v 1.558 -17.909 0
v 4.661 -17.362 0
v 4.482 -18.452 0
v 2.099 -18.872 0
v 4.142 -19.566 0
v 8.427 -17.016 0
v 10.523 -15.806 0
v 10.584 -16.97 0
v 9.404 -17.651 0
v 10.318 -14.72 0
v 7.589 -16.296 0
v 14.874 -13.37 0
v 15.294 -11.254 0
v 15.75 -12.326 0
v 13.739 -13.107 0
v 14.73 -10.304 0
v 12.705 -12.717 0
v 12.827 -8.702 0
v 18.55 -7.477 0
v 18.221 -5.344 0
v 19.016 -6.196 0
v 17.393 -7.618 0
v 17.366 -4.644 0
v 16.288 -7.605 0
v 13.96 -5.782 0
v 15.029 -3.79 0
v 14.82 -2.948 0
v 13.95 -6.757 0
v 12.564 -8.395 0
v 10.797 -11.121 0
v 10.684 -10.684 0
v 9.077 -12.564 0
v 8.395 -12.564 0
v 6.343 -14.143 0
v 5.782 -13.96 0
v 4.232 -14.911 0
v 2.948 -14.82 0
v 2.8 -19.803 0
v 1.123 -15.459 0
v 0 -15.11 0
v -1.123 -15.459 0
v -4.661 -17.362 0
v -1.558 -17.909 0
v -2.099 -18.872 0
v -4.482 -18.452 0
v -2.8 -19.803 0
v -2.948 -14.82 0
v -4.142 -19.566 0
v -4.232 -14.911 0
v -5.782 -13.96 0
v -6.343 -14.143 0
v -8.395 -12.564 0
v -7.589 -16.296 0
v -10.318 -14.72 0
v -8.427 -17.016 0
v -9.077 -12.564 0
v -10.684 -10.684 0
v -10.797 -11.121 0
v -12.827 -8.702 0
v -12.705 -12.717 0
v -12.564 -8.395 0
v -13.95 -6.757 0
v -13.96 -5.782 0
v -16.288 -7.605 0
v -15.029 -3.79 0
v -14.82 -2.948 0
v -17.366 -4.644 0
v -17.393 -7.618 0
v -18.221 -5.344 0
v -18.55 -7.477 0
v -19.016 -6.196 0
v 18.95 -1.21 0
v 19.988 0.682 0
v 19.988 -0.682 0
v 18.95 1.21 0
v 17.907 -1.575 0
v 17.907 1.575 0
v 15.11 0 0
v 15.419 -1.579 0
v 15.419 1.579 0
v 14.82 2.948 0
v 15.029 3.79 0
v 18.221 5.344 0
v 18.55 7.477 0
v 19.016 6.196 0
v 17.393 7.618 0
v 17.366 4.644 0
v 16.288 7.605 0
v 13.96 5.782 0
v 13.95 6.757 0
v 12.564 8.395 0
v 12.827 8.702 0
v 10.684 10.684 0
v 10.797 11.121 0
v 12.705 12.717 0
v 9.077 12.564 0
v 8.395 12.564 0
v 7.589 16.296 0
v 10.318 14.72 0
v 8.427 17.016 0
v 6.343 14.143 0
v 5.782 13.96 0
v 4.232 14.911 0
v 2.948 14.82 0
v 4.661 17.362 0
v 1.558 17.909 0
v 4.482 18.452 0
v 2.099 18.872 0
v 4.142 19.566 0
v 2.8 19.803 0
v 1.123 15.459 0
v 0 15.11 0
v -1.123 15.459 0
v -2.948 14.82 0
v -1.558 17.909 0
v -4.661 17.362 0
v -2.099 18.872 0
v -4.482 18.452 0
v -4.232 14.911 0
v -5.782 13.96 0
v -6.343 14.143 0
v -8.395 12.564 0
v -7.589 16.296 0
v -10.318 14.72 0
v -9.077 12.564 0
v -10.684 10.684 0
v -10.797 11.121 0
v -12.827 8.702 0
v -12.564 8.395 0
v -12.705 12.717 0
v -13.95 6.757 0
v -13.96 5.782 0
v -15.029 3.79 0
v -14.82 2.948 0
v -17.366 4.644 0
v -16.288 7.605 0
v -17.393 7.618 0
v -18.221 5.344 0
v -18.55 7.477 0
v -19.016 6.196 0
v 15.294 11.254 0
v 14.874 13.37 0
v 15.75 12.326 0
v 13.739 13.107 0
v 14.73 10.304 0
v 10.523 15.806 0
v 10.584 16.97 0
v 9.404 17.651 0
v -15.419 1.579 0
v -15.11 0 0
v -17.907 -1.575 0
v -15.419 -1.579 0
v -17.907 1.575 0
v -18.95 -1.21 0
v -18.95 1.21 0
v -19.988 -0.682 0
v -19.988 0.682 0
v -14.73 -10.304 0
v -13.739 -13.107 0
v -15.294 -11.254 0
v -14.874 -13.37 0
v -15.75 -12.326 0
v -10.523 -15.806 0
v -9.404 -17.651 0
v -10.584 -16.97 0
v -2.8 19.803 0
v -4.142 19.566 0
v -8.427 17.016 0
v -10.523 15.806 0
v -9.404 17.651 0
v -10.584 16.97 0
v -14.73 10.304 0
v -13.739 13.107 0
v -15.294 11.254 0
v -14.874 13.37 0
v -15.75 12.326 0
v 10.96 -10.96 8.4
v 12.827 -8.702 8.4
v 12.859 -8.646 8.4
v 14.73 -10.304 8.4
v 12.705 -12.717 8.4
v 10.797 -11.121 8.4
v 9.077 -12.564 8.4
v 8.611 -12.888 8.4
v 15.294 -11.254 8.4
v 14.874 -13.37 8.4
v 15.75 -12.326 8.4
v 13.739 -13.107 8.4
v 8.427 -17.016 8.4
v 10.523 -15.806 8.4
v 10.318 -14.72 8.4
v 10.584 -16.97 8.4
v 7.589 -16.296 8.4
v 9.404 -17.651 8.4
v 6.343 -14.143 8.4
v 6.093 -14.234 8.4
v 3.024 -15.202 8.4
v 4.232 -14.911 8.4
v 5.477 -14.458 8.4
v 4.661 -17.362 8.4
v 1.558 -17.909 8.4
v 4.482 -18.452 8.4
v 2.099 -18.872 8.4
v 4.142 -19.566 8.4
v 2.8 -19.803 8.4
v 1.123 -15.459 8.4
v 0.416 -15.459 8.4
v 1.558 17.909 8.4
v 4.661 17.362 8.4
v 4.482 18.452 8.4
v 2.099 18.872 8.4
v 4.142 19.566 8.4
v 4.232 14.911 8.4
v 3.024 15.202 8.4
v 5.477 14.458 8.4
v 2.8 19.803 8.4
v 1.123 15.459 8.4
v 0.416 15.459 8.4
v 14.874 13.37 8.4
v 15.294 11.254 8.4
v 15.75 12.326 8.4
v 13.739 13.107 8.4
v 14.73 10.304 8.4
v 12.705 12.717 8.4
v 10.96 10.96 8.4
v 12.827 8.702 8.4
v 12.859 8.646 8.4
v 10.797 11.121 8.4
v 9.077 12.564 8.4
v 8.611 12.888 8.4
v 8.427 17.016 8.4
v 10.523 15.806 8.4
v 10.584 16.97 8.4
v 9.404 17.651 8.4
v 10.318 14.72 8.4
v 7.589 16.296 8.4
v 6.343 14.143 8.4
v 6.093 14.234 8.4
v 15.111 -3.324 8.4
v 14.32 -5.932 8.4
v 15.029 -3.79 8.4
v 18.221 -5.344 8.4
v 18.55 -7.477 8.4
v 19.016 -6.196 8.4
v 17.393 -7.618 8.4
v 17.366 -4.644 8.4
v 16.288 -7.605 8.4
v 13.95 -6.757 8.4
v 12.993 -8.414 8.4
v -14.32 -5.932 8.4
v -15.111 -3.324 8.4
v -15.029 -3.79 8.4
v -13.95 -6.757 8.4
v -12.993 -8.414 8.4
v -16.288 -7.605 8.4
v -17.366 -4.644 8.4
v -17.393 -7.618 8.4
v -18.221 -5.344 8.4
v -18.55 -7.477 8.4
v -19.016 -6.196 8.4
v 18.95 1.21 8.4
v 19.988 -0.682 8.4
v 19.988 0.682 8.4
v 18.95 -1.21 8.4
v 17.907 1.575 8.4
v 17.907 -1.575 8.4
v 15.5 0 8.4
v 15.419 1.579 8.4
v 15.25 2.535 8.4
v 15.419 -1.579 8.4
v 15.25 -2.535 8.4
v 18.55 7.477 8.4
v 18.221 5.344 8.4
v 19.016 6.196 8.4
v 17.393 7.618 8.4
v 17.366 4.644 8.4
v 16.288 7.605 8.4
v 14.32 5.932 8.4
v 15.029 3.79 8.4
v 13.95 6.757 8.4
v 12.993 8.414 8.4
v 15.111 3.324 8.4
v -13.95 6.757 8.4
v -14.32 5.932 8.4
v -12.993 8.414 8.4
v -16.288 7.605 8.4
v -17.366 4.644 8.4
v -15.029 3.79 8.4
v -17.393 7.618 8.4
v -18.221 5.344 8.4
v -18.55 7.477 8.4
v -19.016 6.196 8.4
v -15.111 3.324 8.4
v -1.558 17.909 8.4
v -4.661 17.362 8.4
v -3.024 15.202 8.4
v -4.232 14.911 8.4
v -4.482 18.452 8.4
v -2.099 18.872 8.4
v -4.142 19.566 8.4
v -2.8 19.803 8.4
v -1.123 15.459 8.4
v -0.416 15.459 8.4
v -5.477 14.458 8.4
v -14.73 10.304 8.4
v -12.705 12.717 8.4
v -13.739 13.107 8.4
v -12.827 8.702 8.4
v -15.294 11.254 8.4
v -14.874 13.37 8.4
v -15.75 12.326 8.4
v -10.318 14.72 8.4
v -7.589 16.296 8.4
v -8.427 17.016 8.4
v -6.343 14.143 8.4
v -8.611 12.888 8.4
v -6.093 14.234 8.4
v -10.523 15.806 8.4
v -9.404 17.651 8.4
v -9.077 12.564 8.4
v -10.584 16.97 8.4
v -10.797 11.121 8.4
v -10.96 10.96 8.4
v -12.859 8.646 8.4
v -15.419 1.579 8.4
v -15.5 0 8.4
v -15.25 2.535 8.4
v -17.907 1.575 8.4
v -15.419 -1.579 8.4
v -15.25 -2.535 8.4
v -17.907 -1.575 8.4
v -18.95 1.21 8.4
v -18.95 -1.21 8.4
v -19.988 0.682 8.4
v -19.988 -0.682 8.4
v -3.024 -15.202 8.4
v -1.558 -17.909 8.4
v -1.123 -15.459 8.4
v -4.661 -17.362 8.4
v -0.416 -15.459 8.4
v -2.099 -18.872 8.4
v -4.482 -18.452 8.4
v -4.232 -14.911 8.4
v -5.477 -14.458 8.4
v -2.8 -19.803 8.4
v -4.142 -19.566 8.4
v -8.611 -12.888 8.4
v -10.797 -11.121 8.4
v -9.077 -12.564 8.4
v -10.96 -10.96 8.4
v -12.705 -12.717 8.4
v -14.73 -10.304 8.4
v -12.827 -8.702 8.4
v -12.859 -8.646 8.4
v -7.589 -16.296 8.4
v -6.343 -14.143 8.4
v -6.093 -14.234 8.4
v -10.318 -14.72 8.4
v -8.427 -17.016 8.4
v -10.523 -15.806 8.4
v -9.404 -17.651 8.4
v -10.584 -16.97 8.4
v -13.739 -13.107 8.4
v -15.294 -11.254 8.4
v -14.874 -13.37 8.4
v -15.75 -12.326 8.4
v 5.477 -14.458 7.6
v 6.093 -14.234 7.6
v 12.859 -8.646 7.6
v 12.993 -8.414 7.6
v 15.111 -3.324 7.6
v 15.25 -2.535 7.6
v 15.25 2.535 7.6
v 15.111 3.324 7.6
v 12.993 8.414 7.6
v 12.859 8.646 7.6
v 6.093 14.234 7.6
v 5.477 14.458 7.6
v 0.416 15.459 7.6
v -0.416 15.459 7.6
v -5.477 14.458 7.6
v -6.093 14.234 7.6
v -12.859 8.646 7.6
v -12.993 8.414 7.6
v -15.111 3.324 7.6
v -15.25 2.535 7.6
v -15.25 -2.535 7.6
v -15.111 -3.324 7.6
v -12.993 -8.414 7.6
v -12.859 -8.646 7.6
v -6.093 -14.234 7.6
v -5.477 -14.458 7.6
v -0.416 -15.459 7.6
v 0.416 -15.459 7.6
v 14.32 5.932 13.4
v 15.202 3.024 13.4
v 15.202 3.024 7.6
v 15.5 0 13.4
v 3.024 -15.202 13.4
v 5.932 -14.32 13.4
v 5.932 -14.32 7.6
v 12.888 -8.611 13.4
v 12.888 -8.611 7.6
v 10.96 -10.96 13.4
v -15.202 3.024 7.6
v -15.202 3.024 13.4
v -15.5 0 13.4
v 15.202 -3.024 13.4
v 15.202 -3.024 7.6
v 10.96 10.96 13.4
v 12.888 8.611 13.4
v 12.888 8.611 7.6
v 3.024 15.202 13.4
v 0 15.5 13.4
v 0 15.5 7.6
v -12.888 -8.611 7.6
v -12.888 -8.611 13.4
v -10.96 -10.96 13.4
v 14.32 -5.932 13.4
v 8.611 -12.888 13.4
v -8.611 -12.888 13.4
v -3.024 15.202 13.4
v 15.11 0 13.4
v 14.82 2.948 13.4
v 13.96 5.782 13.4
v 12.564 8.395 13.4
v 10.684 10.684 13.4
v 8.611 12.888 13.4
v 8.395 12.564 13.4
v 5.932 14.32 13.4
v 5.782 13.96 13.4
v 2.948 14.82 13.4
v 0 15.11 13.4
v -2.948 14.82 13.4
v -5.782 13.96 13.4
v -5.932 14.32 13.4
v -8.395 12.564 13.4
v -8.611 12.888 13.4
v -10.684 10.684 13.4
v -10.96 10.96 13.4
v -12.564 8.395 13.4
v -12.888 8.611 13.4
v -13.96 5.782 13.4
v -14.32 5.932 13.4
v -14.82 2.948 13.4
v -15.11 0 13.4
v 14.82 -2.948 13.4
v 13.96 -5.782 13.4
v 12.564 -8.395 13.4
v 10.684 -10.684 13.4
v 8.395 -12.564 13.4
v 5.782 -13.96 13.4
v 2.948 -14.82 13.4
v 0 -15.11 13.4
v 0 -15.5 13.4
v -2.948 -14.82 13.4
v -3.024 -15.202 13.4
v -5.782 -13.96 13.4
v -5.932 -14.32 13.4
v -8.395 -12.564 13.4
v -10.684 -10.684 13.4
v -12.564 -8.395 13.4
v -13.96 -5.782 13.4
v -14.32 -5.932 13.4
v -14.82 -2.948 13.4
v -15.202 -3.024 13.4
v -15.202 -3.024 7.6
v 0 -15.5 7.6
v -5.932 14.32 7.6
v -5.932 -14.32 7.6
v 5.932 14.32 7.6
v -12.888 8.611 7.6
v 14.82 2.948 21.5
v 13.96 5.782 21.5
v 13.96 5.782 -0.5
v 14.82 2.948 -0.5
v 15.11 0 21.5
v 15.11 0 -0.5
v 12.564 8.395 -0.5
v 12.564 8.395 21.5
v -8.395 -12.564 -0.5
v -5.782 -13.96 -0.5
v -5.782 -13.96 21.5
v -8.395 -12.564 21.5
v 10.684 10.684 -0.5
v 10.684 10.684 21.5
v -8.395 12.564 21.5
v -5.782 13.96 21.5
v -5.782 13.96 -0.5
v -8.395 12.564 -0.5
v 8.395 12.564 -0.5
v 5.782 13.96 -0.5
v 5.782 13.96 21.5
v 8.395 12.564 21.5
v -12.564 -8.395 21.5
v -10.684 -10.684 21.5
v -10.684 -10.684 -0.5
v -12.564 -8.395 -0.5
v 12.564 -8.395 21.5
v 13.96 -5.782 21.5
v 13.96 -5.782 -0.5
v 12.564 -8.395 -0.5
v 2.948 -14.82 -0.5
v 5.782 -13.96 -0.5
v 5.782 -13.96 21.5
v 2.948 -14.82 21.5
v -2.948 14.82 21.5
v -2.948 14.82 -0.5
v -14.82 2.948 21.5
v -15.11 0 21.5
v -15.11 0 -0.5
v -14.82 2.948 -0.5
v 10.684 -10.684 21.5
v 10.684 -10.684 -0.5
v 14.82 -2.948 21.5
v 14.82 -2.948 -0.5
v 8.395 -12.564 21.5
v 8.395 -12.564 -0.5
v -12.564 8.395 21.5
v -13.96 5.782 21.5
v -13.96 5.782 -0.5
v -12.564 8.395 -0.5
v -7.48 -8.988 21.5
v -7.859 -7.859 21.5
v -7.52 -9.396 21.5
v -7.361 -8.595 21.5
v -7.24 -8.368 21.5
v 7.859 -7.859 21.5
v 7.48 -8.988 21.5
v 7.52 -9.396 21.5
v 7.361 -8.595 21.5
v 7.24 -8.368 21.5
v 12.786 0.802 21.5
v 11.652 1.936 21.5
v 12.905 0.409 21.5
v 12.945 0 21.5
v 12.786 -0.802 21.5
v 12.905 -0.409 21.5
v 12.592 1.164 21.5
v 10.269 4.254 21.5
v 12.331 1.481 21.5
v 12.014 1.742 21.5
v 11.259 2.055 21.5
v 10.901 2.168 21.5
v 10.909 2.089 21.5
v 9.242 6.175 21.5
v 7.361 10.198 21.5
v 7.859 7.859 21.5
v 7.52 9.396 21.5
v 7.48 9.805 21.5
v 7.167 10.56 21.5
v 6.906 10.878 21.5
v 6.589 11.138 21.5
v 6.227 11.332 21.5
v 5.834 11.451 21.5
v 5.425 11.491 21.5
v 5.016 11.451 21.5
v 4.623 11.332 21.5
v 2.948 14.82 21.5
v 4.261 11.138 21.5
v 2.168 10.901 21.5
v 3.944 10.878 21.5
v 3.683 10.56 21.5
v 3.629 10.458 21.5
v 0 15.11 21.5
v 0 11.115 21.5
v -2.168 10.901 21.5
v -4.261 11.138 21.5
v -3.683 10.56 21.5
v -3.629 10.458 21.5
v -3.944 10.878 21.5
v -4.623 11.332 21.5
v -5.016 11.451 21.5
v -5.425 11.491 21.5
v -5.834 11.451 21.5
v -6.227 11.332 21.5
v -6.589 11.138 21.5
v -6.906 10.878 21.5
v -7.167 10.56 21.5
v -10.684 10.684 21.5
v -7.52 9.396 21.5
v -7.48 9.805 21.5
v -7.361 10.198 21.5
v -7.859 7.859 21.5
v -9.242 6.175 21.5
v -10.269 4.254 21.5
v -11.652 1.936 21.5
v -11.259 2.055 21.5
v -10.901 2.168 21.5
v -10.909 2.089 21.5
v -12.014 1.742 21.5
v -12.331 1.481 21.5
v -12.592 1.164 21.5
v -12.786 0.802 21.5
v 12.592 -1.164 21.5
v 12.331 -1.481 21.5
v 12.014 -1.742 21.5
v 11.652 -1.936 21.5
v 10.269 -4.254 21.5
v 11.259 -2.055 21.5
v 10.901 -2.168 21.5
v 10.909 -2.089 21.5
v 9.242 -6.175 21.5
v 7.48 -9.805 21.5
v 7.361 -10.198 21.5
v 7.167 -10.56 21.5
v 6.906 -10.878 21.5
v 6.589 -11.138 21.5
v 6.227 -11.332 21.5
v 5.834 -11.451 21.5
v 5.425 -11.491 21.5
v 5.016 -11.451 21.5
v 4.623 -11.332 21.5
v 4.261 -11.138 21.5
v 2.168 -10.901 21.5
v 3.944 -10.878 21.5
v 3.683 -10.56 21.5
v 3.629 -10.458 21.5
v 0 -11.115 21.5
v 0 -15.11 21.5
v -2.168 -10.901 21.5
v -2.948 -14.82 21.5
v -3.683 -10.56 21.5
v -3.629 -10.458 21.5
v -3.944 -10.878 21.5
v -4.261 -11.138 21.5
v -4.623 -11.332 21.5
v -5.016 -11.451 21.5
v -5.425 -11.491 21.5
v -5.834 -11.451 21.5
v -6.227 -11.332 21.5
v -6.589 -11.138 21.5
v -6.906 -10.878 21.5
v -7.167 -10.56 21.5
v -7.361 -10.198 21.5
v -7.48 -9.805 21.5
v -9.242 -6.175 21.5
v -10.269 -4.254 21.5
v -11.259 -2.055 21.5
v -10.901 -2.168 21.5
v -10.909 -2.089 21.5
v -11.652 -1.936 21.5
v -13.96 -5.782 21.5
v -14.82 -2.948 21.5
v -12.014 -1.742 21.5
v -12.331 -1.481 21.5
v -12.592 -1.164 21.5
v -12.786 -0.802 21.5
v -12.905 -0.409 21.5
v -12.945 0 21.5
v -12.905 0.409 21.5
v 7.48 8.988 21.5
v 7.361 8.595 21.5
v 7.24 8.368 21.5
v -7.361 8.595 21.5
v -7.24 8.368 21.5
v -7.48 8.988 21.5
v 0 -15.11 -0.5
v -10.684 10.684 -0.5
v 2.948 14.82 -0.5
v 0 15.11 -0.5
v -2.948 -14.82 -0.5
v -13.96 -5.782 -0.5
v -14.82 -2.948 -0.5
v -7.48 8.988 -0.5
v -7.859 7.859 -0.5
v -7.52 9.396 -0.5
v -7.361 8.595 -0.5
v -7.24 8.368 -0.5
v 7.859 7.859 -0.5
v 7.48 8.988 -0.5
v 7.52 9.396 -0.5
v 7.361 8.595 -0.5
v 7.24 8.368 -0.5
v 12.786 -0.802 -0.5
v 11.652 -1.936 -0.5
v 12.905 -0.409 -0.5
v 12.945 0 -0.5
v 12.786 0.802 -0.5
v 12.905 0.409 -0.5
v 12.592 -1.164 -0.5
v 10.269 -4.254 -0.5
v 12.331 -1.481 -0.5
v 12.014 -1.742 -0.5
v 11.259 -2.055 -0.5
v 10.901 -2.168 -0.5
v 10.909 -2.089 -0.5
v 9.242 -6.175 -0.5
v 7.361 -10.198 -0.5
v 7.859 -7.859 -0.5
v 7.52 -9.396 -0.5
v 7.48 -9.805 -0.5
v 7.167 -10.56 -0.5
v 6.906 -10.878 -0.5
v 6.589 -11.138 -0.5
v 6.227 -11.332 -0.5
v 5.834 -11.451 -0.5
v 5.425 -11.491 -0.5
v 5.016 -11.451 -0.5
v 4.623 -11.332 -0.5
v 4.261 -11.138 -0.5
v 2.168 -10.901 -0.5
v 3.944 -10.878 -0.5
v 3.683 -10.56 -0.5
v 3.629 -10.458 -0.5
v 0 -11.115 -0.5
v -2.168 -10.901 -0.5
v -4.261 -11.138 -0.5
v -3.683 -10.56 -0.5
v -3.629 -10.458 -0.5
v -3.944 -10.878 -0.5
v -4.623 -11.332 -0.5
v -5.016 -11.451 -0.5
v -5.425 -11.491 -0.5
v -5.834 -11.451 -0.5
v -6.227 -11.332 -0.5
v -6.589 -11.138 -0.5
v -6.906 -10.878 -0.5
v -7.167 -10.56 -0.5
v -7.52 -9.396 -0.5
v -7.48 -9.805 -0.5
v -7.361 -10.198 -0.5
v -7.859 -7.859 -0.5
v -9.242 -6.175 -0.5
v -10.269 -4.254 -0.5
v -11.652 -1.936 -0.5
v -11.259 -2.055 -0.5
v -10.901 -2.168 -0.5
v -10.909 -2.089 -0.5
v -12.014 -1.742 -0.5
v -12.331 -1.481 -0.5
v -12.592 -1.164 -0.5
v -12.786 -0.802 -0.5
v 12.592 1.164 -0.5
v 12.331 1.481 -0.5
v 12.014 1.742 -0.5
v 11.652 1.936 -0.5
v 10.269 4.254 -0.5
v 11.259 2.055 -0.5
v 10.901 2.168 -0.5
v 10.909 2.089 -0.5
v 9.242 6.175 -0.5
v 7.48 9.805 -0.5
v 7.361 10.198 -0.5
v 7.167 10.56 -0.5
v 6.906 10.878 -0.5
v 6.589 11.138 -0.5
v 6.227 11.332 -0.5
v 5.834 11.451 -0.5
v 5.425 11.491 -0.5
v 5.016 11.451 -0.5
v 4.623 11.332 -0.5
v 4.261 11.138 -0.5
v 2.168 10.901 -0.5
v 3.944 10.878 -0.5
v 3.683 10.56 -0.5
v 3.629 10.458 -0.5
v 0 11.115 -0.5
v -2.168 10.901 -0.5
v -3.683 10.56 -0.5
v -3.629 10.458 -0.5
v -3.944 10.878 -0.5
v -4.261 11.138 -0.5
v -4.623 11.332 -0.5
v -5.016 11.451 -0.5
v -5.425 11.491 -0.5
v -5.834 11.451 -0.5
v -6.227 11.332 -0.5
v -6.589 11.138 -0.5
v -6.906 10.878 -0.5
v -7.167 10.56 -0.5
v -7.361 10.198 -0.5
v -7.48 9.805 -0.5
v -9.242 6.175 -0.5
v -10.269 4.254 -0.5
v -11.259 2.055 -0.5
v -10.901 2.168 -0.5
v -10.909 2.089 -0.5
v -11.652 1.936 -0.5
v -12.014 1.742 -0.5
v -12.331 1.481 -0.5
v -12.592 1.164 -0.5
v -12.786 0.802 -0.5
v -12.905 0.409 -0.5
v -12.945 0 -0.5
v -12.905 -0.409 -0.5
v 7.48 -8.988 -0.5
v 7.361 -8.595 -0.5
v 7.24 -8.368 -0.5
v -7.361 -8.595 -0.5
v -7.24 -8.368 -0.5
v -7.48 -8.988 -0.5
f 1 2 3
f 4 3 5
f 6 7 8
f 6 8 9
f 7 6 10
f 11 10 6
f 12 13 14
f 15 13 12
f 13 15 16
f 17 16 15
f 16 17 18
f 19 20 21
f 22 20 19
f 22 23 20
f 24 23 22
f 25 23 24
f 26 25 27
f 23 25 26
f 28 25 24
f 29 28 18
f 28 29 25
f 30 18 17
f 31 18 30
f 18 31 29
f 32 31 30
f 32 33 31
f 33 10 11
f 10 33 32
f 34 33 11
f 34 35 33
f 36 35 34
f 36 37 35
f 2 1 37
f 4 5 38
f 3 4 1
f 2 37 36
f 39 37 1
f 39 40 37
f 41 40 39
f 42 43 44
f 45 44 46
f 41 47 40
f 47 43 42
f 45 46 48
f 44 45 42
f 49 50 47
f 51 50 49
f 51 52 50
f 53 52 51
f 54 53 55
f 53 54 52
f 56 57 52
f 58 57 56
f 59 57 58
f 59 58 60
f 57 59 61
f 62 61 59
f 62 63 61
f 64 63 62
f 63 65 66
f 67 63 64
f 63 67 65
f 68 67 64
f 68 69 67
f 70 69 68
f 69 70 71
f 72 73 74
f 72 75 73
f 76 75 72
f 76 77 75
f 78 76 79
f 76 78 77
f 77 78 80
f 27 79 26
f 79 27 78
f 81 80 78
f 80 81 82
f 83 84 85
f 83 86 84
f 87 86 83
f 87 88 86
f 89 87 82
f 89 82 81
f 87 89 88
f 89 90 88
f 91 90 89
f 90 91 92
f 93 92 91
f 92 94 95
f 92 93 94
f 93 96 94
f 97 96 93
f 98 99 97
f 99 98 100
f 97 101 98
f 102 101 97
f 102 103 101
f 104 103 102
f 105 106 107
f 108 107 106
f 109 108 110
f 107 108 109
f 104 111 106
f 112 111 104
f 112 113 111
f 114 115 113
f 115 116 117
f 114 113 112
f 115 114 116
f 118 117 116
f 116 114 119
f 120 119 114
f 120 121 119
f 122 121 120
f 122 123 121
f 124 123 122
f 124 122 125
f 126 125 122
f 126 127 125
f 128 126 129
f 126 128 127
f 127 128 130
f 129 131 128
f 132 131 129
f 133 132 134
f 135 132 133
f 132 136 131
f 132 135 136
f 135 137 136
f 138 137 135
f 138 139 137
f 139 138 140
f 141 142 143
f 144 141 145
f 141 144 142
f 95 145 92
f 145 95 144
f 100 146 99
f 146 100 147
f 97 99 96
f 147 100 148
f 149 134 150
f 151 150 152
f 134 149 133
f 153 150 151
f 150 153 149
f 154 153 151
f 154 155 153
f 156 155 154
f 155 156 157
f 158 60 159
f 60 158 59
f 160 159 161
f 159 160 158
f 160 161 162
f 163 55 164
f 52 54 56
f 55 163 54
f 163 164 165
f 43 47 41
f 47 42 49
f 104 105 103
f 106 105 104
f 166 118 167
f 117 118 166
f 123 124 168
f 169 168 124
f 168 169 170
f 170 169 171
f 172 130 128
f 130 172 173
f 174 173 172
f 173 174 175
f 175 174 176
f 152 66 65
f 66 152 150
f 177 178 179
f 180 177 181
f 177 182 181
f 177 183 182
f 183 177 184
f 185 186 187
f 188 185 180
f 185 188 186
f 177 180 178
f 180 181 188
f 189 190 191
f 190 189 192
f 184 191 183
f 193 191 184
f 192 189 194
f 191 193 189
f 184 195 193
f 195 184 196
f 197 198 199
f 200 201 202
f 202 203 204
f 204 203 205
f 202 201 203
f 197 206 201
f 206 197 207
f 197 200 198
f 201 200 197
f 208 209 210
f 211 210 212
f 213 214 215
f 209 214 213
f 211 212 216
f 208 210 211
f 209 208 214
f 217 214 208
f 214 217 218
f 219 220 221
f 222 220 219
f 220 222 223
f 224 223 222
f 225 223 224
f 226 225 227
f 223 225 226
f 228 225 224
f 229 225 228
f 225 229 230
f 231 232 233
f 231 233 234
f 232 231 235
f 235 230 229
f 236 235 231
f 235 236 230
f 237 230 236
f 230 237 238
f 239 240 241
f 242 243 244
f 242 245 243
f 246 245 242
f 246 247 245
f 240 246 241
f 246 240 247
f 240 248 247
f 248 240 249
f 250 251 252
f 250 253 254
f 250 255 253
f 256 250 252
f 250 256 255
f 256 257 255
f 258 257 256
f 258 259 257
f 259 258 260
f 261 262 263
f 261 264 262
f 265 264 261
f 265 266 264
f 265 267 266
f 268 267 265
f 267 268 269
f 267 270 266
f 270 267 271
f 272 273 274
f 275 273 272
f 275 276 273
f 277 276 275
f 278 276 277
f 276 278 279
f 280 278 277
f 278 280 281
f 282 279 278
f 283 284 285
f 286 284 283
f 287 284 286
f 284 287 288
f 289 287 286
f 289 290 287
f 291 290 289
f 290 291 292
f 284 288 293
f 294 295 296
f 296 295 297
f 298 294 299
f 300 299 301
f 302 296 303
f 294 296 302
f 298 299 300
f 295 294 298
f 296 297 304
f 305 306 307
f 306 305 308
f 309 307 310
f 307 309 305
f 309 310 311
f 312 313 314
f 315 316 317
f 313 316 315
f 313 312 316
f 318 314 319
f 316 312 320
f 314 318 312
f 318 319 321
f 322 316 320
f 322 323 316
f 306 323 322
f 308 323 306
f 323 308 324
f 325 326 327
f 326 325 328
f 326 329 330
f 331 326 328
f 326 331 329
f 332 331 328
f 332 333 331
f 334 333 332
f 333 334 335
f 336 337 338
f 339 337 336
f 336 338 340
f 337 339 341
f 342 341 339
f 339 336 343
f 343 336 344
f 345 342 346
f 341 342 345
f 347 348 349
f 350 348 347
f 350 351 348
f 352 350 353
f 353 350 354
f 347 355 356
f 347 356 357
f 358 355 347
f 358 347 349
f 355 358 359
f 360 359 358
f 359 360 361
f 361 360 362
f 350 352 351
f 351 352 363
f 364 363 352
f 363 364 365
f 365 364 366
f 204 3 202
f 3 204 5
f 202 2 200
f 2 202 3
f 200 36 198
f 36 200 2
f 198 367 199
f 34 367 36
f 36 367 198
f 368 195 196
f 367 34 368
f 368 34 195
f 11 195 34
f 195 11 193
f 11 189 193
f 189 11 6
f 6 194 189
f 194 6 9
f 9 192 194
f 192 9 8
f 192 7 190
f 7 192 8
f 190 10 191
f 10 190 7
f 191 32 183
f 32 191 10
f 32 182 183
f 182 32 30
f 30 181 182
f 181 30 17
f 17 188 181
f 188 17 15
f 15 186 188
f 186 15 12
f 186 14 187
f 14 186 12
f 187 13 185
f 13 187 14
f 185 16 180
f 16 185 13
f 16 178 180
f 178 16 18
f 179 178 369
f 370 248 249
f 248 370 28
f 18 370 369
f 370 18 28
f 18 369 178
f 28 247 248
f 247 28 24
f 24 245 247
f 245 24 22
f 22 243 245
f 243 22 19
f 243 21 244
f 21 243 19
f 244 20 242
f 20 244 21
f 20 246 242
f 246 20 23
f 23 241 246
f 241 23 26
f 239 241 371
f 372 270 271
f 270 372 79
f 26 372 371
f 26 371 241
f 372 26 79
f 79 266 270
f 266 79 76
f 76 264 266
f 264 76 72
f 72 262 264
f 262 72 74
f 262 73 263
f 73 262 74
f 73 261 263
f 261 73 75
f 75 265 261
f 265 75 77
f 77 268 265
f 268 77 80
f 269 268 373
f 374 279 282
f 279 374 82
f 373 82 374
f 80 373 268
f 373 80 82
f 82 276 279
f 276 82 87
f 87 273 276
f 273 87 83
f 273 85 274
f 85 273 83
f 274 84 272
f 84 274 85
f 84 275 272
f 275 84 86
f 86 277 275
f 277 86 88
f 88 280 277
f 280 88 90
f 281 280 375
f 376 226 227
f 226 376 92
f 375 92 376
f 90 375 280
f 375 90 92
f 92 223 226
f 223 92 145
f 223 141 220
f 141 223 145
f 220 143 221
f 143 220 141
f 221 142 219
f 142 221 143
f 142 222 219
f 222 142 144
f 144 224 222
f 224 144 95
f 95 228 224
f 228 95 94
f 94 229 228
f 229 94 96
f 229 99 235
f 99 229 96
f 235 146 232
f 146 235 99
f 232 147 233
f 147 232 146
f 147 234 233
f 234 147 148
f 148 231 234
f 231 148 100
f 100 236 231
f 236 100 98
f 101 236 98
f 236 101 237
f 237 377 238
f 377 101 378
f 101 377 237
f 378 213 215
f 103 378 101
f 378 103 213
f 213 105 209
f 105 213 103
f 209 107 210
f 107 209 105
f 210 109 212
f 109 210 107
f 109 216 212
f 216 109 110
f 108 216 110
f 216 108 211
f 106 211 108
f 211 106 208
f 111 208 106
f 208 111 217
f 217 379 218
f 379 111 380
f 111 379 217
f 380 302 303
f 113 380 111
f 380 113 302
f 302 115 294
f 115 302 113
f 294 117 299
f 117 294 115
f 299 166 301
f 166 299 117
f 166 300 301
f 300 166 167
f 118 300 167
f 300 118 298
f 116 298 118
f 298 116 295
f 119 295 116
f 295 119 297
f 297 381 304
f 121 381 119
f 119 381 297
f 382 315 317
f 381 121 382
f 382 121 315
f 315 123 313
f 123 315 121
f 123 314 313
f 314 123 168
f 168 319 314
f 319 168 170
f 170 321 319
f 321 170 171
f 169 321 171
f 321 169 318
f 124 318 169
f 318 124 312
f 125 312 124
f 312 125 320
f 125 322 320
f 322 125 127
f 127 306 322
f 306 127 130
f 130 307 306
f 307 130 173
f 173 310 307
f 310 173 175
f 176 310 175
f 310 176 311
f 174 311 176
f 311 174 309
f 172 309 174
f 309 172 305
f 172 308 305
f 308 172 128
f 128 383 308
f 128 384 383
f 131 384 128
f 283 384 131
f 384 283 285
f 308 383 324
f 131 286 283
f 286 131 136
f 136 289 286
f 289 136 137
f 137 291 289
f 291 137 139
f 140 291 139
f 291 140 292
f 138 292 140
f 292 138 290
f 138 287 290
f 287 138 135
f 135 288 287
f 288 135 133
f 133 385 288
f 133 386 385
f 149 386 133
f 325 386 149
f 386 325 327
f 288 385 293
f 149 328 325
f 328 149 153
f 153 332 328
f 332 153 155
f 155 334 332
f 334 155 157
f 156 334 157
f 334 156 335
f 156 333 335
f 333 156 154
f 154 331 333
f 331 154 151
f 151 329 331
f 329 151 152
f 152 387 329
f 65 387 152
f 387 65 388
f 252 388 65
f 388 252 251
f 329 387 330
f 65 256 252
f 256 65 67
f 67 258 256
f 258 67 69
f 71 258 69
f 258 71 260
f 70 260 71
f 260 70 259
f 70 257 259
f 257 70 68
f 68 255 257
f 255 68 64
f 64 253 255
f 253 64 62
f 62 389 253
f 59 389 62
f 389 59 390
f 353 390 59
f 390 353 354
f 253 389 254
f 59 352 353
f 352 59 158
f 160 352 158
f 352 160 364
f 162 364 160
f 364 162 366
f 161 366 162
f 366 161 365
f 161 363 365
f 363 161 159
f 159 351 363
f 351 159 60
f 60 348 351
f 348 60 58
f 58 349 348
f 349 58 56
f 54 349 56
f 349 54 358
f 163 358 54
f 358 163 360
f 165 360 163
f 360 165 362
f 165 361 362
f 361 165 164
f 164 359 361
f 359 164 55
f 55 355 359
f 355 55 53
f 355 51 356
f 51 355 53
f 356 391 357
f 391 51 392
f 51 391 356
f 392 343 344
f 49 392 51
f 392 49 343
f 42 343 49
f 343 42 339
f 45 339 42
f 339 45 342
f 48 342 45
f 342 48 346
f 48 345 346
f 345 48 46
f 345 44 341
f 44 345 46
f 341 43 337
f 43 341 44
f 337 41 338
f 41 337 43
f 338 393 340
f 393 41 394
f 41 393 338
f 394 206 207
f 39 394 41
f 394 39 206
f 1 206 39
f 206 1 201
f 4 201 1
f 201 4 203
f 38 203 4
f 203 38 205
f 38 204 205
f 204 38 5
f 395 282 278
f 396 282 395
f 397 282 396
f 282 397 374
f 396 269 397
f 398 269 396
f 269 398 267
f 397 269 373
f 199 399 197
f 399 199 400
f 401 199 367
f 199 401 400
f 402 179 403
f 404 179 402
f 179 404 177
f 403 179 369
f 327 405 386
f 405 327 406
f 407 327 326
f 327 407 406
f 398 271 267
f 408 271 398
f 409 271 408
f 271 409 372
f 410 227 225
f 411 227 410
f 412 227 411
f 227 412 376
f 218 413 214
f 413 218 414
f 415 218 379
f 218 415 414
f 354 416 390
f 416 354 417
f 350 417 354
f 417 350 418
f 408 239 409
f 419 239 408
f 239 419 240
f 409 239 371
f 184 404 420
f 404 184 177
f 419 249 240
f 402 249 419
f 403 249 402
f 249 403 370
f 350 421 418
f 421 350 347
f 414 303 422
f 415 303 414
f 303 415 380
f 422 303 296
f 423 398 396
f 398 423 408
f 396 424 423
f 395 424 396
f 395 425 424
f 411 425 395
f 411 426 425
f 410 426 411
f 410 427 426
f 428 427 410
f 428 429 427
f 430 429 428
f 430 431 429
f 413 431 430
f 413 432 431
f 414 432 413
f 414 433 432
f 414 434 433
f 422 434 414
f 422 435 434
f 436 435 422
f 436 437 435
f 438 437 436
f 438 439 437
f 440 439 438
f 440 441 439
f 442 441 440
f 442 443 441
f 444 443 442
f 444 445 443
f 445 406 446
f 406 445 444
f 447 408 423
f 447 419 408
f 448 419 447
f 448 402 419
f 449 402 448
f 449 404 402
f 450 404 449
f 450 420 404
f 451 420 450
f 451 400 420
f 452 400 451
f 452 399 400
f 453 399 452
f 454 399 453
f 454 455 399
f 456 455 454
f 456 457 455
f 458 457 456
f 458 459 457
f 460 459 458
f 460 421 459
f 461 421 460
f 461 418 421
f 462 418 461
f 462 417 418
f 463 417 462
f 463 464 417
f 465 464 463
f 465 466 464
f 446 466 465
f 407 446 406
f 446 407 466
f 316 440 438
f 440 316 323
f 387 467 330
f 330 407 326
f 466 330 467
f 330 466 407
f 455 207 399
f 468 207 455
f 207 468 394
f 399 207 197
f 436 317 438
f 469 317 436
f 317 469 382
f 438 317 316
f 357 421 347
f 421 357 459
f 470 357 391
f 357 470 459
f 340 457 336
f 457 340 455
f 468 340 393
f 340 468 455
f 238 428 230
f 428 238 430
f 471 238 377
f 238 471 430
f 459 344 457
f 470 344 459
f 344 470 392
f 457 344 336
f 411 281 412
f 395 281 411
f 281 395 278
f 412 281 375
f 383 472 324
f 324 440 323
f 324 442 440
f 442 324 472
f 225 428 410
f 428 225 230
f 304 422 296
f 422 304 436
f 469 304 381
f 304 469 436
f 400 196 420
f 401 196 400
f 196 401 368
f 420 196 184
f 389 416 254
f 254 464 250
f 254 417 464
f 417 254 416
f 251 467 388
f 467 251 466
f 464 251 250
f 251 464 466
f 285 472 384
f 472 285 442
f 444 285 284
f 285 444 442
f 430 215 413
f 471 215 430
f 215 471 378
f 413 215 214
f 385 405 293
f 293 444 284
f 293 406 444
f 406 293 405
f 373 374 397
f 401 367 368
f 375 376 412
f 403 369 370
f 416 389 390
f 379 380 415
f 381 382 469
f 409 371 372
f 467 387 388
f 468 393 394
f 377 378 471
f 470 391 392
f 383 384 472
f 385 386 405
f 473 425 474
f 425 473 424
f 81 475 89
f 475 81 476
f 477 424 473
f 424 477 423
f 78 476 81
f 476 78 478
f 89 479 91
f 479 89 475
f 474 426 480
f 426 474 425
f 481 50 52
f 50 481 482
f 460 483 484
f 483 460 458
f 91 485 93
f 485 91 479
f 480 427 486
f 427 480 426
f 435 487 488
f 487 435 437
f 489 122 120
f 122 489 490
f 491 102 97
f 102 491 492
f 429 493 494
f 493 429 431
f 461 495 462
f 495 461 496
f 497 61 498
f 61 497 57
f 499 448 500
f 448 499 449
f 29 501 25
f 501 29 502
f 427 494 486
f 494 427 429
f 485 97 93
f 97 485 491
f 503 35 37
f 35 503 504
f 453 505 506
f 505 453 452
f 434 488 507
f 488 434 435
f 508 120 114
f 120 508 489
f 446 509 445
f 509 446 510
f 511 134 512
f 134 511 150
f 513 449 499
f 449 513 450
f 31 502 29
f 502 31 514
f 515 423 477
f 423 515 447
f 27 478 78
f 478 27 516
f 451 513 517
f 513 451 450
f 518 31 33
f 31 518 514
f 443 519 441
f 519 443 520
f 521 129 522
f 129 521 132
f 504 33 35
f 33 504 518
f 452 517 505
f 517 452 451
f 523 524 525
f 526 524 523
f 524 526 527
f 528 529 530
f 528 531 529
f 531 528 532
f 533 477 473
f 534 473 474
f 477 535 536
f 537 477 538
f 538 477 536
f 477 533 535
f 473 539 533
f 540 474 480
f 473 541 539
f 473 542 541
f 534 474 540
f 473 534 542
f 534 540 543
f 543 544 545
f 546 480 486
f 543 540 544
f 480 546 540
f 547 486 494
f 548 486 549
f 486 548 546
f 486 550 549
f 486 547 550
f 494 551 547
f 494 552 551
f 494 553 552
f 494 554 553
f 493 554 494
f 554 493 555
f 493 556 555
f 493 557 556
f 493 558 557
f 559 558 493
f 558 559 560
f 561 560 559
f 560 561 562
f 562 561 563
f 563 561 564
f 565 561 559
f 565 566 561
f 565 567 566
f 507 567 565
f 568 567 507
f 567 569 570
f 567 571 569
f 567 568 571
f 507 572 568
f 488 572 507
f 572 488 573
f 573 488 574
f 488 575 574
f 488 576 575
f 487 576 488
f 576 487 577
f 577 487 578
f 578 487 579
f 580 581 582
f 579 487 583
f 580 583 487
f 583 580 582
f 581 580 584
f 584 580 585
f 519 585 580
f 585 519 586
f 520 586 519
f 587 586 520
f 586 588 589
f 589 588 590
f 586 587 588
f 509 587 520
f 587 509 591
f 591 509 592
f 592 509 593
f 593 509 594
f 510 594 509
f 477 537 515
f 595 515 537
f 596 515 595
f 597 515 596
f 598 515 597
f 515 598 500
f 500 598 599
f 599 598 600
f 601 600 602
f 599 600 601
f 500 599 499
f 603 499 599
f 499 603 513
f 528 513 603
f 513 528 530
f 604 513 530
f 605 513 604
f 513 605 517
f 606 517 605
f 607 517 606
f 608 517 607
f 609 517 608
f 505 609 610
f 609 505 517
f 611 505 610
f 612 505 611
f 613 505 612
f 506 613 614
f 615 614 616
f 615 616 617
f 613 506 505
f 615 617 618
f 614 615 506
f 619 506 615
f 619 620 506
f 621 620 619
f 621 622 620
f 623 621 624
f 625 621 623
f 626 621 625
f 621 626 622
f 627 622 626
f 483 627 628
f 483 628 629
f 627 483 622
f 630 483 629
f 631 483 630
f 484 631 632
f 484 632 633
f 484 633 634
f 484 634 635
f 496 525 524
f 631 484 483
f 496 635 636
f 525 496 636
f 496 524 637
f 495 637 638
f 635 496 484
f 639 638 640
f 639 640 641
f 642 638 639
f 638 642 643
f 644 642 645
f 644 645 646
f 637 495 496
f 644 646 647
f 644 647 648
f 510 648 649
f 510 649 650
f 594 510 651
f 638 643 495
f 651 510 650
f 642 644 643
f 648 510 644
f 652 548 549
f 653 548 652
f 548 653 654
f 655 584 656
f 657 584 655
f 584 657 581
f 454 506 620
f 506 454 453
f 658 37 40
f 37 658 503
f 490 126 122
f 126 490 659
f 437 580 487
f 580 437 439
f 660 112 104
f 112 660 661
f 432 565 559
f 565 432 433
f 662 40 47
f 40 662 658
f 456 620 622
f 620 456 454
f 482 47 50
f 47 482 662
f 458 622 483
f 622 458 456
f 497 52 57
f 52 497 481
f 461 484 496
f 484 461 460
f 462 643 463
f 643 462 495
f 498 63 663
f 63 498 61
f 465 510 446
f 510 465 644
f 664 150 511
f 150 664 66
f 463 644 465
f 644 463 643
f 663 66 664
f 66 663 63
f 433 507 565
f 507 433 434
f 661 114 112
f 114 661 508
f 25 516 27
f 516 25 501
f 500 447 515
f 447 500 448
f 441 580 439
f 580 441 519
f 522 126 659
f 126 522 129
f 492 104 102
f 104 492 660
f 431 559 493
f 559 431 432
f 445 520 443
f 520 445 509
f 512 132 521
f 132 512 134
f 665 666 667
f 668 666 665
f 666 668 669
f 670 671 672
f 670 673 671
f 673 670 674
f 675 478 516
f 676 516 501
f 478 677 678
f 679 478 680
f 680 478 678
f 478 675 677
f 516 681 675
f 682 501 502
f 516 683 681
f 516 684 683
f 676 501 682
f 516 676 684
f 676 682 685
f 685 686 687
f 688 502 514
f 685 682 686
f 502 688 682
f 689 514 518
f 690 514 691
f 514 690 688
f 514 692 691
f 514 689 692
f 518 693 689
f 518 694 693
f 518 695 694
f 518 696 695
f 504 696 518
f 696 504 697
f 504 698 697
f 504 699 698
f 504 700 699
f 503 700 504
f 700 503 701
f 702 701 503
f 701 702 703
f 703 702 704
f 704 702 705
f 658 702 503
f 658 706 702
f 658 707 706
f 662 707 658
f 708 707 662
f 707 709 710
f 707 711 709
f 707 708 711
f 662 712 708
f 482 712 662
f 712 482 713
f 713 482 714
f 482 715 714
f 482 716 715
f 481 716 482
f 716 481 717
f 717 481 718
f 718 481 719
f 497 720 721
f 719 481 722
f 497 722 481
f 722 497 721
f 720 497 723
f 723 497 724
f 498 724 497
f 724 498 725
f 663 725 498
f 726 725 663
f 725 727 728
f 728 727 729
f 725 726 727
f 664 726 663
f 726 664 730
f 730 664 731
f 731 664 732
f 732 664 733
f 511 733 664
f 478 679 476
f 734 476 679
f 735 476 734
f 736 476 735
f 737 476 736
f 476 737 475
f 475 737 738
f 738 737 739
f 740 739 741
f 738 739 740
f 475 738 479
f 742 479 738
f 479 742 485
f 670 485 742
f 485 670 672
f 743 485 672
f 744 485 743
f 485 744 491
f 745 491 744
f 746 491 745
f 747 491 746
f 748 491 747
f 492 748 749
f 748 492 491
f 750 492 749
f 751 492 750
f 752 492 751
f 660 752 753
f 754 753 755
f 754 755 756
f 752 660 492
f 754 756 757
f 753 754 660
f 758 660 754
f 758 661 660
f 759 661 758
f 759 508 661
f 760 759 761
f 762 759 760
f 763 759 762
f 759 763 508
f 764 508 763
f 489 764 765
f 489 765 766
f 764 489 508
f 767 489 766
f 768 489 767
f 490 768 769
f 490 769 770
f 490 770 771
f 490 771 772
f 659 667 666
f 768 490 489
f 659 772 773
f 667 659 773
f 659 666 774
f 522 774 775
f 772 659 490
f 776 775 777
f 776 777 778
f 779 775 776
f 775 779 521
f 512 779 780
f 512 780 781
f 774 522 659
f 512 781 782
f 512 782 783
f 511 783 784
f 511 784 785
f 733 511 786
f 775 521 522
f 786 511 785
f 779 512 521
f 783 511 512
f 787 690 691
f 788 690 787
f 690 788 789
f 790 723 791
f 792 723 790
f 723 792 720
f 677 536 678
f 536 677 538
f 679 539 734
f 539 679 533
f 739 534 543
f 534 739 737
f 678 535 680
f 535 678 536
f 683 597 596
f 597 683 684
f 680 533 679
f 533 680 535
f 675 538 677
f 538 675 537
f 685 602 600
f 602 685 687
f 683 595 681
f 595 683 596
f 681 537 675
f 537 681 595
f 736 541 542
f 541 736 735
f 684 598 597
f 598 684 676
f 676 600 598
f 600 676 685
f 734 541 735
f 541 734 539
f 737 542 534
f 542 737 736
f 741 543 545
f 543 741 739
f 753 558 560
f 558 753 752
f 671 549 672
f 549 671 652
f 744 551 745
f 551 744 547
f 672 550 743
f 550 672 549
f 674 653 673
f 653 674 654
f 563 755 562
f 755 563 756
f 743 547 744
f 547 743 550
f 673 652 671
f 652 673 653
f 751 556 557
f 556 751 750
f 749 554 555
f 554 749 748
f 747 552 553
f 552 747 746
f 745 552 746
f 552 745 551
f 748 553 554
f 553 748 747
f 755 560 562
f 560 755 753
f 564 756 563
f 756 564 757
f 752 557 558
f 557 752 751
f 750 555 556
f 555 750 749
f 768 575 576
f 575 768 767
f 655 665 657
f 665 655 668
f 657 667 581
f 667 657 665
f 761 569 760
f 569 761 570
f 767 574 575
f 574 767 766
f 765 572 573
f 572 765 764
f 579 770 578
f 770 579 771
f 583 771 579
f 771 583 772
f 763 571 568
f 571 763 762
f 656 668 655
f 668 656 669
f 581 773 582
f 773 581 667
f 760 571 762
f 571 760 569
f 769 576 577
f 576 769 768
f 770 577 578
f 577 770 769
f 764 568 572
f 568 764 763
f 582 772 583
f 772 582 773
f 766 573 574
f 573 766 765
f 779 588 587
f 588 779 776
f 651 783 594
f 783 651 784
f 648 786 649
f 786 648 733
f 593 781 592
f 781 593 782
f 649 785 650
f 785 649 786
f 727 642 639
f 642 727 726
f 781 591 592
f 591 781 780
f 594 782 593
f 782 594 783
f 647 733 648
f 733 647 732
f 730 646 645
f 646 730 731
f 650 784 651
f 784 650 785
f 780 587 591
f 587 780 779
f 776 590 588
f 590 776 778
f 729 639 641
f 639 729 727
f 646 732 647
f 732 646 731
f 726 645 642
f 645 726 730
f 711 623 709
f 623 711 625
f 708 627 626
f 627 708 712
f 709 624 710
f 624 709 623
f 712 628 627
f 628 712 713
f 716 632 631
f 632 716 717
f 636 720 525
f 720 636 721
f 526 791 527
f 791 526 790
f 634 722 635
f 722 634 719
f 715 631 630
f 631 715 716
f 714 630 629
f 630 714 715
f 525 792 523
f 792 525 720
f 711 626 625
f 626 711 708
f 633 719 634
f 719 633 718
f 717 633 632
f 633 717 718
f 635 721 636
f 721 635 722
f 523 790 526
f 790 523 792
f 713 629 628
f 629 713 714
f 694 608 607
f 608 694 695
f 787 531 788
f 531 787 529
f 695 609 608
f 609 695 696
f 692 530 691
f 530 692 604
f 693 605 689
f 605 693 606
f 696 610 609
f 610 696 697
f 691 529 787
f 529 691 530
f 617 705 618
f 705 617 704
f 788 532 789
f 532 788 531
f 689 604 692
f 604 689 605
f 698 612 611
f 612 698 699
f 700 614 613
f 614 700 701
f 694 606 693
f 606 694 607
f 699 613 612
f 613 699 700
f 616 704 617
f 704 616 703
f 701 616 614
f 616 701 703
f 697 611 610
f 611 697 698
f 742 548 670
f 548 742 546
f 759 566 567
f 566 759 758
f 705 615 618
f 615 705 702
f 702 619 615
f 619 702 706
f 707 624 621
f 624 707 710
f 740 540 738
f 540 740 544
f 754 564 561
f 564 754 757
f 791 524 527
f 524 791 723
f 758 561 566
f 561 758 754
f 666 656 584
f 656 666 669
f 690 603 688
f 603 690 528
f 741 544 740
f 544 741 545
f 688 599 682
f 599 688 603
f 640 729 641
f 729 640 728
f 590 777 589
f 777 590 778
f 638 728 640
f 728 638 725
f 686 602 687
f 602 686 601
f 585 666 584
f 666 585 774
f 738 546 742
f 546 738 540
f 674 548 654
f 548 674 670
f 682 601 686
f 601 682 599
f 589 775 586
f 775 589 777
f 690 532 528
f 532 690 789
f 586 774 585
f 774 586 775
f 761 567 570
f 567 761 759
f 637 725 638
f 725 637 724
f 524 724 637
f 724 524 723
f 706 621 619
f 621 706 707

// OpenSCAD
$fn = 32;

// ----------------------------------------------------------------------
// Two-module gear rim: z18 m2 and z20 m1.2, 21 mm wide
// ----------------------------------------------------------------------

// --- parameters (mm) ---
module_a = 2;             // first tooth module
teeth_a = 18;             // first band tooth count
module_b = 1.2;           // second tooth module
teeth_b = 20;             // second band tooth count
band_h = 8;               // height of one tooth band
web_t = 5;                // web thickness between the bands
total = 21;               // overall width over both bands
root_r = 15.5;            // root radius of the coarse band
hub_r = 15.11;            // hub radius
bore_d = 22.23;           // hub bore
hole_count = 6;           // lightening holes
hole_r = 10.85;           // lightening hole circle radius
hole_d = 4.19;            // lightening hole diameter

band_a = [[15.419, -1.579], [17.907, -1.575], [18.95, -1.21], [19.988, -0.682], [19.988, 0.682], [18.95, 1.21], [17.907, 1.575], [15.419, 1.579], [15.029, 3.79], [17.366, 4.644], [18.221, 5.344], [19.016, 6.196], [18.55, 7.477], [17.393, 7.618], [16.288, 7.605], [13.95, 6.757], [12.827, 8.702], [14.73, 10.304], [15.294, 11.254], [15.75, 12.326], [14.874, 13.37], [13.739, 13.107], [12.705, 12.717], [10.797, 11.121], [9.077, 12.564], [10.318, 14.72], [10.523, 15.806], [10.584, 16.97], [9.404, 17.651], [8.427, 17.016], [7.589, 16.296], [6.343, 14.143], [4.232, 14.911], [4.661, 17.362], [4.482, 18.452], [4.142, 19.566], [2.8, 19.803], [2.099, 18.872], [1.558, 17.909], [1.123, 15.459], [-1.123, 15.459], [-1.558, 17.909], [-2.099, 18.872], [-2.8, 19.803], [-4.142, 19.566], [-4.482, 18.452], [-4.661, 17.362], [-4.232, 14.911], [-6.343, 14.143], [-7.589, 16.296], [-8.427, 17.016], [-9.404, 17.651], [-10.584, 16.97], [-10.523, 15.806], [-10.318, 14.72], [-9.077, 12.564], [-10.797, 11.121], [-12.705, 12.717], [-13.739, 13.107], [-14.874, 13.37], [-15.75, 12.326], [-15.294, 11.254], [-14.73, 10.304], [-12.827, 8.702], [-13.95, 6.757], [-16.288, 7.605], [-17.393, 7.618], [-18.55, 7.477], [-19.016, 6.196], [-18.221, 5.344], [-17.366, 4.644], [-15.029, 3.79], [-15.419, 1.579], [-17.907, 1.575], [-18.95, 1.21], [-19.988, 0.682], [-19.988, -0.682], [-18.95, -1.21], [-17.907, -1.575], [-15.419, -1.579], [-15.029, -3.79], [-17.366, -4.644], [-18.221, -5.344], [-19.016, -6.196], [-18.55, -7.477], [-17.393, -7.618], [-16.288, -7.605], [-13.95, -6.757], [-12.827, -8.702], [-14.73, -10.304], [-15.294, -11.254], [-15.75, -12.326], [-14.874, -13.37], [-13.739, -13.107], [-12.705, -12.717], [-10.797, -11.121], [-9.077, -12.564], [-10.318, -14.72], [-10.523, -15.806], [-10.584, -16.97], [-9.404, -17.651], [-8.427, -17.016], [-7.589, -16.296], [-6.343, -14.143], [-4.232, -14.911], [-4.661, -17.362], [-4.482, -18.452], [-4.142, -19.566], [-2.8, -19.803], [-2.099, -18.872], [-1.558, -17.909], [-1.123, -15.459], [1.123, -15.459], [1.558, -17.909], [2.099, -18.872], [2.8, -19.803], [4.142, -19.566], [4.482, -18.452], [4.661, -17.362], [4.232, -14.911], [6.343, -14.143], [7.589, -16.296], [8.427, -17.016], [9.404, -17.651], [10.584, -16.97], [10.523, -15.806], [10.318, -14.72], [9.077, -12.564], [10.797, -11.121], [12.705, -12.717], [13.739, -13.107], [14.874, -13.37], [15.75, -12.326], [15.294, -11.254], [14.73, -10.304], [12.827, -8.702], [13.95, -6.757], [16.288, -7.605], [17.393, -7.618], [18.55, -7.477], [19.016, -6.196], [18.221, -5.344], [17.366, -4.644], [15.029, -3.79]];
band_b = [[10.454, -0.977], [11.913, -0.955], [12.554, -0.733], [13.193, -0.417], [13.193, 0.417], [12.554, 0.733], [11.913, 0.955], [10.454, 0.977], [10.245, 2.302], [11.625, 2.773], [12.166, 3.182], [12.677, 3.681], [12.419, 4.473], [11.713, 4.577], [11.034, 4.59], [9.641, 4.16], [9.032, 5.355], [10.199, 6.229], [10.587, 6.786], [10.919, 7.418], [10.429, 8.092], [9.725, 7.972], [9.076, 7.775], [7.884, 6.935], [6.935, 7.884], [7.775, 9.076], [7.972, 9.725], [8.092, 10.429], [7.418, 10.919], [6.786, 10.587], [6.229, 10.199], [5.355, 9.032], [4.16, 9.641], [4.59, 11.034], [4.577, 11.713], [4.473, 12.419], [3.681, 12.677], [3.182, 12.166], [2.773, 11.625], [2.302, 10.245], [0.977, 10.454], [0.955, 11.913], [0.733, 12.554], [0.417, 13.193], [-0.417, 13.193], [-0.733, 12.554], [-0.955, 11.913], [-0.977, 10.454], [-2.302, 10.245], [-2.773, 11.625], [-3.182, 12.166], [-3.681, 12.677], [-4.473, 12.419], [-4.577, 11.713], [-4.59, 11.034], [-4.16, 9.641], [-5.355, 9.032], [-6.229, 10.199], [-6.786, 10.587], [-7.418, 10.919], [-8.092, 10.429], [-7.972, 9.725], [-7.775, 9.076], [-6.935, 7.884], [-7.884, 6.935], [-9.076, 7.775], [-9.725, 7.972], [-10.429, 8.092], [-10.919, 7.418], [-10.587, 6.786], [-10.199, 6.229], [-9.032, 5.355], [-9.641, 4.16], [-11.034, 4.59], [-11.713, 4.577], [-12.419, 4.473], [-12.677, 3.681], [-12.166, 3.182], [-11.625, 2.773], [-10.245, 2.302], [-10.454, 0.977], [-11.913, 0.955], [-12.554, 0.733], [-13.193, 0.417], [-13.193, -0.417], [-12.554, -0.733], [-11.913, -0.955], [-10.454, -0.977], [-10.245, -2.302], [-11.625, -2.773], [-12.166, -3.182], [-12.677, -3.681], [-12.419, -4.473], [-11.713, -4.577], [-11.034, -4.59], [-9.641, -4.16], [-9.032, -5.355], [-10.199, -6.229], [-10.587, -6.786], [-10.919, -7.418], [-10.429, -8.092], [-9.725, -7.972], [-9.076, -7.775], [-7.884, -6.935], [-6.935, -7.884], [-7.775, -9.076], [-7.972, -9.725], [-8.092, -10.429], [-7.418, -10.919], [-6.786, -10.587], [-6.229, -10.199], [-5.355, -9.032], [-4.16, -9.641], [-4.59, -11.034], [-4.577, -11.713], [-4.473, -12.419], [-3.681, -12.677], [-3.182, -12.166], [-2.773, -11.625], [-2.302, -10.245], [-0.977, -10.454], [-0.955, -11.913], [-0.733, -12.554], [-0.417, -13.193], [0.417, -13.193], [0.733, -12.554], [0.955, -11.913], [0.977, -10.454], [2.302, -10.245], [2.773, -11.625], [3.182, -12.166], [3.681, -12.677], [4.473, -12.419], [4.577, -11.713], [4.59, -11.034], [4.16, -9.641], [5.355, -9.032], [6.229, -10.199], [6.786, -10.587], [7.418, -10.919], [8.092, -10.429], [7.972, -9.725], [7.775, -9.076], [6.935, -7.884], [7.884, -6.935], [9.076, -7.775], [9.725, -7.972], [10.429, -8.092], [10.919, -7.418], [10.587, -6.786], [10.199, -6.229], [9.032, -5.355], [9.641, -4.16], [11.034, -4.59], [11.713, -4.577], [12.419, -4.473], [12.677, -3.681], [12.166, -3.182], [11.625, -2.773], [10.245, -2.302]];

difference() {
  union() {
    /* tooth band A, overlapping the web by 0.4 mm */
    linear_extrude(height = band_h + 0.4) polygon(band_a);
    /* web */
    translate([0, 0, band_h - 0.4]) cylinder(h = web_t + 0.8, d = 2 * root_r);
    /* tooth band B */
    translate([0, 0, band_h + web_t]) linear_extrude(height = band_h + 0.4) polygon(band_b);
    /* hub */
    translate([0, 0, -0.5]) cylinder(h = total + 1.0, d = 2 * hub_r);
  }
  /* bore */
  translate([0, 0, -2.5]) cylinder(h = total + 5, d = bore_d);
  /* lightening holes through the web */
  for (i = [0 : hole_count - 1]) {
    a = i * 360 / hole_count;
    translate([hole_r * cos(a), hole_r * sin(a), -2.5]) cylinder(h = total + 5, d = hole_d);
  }
}
